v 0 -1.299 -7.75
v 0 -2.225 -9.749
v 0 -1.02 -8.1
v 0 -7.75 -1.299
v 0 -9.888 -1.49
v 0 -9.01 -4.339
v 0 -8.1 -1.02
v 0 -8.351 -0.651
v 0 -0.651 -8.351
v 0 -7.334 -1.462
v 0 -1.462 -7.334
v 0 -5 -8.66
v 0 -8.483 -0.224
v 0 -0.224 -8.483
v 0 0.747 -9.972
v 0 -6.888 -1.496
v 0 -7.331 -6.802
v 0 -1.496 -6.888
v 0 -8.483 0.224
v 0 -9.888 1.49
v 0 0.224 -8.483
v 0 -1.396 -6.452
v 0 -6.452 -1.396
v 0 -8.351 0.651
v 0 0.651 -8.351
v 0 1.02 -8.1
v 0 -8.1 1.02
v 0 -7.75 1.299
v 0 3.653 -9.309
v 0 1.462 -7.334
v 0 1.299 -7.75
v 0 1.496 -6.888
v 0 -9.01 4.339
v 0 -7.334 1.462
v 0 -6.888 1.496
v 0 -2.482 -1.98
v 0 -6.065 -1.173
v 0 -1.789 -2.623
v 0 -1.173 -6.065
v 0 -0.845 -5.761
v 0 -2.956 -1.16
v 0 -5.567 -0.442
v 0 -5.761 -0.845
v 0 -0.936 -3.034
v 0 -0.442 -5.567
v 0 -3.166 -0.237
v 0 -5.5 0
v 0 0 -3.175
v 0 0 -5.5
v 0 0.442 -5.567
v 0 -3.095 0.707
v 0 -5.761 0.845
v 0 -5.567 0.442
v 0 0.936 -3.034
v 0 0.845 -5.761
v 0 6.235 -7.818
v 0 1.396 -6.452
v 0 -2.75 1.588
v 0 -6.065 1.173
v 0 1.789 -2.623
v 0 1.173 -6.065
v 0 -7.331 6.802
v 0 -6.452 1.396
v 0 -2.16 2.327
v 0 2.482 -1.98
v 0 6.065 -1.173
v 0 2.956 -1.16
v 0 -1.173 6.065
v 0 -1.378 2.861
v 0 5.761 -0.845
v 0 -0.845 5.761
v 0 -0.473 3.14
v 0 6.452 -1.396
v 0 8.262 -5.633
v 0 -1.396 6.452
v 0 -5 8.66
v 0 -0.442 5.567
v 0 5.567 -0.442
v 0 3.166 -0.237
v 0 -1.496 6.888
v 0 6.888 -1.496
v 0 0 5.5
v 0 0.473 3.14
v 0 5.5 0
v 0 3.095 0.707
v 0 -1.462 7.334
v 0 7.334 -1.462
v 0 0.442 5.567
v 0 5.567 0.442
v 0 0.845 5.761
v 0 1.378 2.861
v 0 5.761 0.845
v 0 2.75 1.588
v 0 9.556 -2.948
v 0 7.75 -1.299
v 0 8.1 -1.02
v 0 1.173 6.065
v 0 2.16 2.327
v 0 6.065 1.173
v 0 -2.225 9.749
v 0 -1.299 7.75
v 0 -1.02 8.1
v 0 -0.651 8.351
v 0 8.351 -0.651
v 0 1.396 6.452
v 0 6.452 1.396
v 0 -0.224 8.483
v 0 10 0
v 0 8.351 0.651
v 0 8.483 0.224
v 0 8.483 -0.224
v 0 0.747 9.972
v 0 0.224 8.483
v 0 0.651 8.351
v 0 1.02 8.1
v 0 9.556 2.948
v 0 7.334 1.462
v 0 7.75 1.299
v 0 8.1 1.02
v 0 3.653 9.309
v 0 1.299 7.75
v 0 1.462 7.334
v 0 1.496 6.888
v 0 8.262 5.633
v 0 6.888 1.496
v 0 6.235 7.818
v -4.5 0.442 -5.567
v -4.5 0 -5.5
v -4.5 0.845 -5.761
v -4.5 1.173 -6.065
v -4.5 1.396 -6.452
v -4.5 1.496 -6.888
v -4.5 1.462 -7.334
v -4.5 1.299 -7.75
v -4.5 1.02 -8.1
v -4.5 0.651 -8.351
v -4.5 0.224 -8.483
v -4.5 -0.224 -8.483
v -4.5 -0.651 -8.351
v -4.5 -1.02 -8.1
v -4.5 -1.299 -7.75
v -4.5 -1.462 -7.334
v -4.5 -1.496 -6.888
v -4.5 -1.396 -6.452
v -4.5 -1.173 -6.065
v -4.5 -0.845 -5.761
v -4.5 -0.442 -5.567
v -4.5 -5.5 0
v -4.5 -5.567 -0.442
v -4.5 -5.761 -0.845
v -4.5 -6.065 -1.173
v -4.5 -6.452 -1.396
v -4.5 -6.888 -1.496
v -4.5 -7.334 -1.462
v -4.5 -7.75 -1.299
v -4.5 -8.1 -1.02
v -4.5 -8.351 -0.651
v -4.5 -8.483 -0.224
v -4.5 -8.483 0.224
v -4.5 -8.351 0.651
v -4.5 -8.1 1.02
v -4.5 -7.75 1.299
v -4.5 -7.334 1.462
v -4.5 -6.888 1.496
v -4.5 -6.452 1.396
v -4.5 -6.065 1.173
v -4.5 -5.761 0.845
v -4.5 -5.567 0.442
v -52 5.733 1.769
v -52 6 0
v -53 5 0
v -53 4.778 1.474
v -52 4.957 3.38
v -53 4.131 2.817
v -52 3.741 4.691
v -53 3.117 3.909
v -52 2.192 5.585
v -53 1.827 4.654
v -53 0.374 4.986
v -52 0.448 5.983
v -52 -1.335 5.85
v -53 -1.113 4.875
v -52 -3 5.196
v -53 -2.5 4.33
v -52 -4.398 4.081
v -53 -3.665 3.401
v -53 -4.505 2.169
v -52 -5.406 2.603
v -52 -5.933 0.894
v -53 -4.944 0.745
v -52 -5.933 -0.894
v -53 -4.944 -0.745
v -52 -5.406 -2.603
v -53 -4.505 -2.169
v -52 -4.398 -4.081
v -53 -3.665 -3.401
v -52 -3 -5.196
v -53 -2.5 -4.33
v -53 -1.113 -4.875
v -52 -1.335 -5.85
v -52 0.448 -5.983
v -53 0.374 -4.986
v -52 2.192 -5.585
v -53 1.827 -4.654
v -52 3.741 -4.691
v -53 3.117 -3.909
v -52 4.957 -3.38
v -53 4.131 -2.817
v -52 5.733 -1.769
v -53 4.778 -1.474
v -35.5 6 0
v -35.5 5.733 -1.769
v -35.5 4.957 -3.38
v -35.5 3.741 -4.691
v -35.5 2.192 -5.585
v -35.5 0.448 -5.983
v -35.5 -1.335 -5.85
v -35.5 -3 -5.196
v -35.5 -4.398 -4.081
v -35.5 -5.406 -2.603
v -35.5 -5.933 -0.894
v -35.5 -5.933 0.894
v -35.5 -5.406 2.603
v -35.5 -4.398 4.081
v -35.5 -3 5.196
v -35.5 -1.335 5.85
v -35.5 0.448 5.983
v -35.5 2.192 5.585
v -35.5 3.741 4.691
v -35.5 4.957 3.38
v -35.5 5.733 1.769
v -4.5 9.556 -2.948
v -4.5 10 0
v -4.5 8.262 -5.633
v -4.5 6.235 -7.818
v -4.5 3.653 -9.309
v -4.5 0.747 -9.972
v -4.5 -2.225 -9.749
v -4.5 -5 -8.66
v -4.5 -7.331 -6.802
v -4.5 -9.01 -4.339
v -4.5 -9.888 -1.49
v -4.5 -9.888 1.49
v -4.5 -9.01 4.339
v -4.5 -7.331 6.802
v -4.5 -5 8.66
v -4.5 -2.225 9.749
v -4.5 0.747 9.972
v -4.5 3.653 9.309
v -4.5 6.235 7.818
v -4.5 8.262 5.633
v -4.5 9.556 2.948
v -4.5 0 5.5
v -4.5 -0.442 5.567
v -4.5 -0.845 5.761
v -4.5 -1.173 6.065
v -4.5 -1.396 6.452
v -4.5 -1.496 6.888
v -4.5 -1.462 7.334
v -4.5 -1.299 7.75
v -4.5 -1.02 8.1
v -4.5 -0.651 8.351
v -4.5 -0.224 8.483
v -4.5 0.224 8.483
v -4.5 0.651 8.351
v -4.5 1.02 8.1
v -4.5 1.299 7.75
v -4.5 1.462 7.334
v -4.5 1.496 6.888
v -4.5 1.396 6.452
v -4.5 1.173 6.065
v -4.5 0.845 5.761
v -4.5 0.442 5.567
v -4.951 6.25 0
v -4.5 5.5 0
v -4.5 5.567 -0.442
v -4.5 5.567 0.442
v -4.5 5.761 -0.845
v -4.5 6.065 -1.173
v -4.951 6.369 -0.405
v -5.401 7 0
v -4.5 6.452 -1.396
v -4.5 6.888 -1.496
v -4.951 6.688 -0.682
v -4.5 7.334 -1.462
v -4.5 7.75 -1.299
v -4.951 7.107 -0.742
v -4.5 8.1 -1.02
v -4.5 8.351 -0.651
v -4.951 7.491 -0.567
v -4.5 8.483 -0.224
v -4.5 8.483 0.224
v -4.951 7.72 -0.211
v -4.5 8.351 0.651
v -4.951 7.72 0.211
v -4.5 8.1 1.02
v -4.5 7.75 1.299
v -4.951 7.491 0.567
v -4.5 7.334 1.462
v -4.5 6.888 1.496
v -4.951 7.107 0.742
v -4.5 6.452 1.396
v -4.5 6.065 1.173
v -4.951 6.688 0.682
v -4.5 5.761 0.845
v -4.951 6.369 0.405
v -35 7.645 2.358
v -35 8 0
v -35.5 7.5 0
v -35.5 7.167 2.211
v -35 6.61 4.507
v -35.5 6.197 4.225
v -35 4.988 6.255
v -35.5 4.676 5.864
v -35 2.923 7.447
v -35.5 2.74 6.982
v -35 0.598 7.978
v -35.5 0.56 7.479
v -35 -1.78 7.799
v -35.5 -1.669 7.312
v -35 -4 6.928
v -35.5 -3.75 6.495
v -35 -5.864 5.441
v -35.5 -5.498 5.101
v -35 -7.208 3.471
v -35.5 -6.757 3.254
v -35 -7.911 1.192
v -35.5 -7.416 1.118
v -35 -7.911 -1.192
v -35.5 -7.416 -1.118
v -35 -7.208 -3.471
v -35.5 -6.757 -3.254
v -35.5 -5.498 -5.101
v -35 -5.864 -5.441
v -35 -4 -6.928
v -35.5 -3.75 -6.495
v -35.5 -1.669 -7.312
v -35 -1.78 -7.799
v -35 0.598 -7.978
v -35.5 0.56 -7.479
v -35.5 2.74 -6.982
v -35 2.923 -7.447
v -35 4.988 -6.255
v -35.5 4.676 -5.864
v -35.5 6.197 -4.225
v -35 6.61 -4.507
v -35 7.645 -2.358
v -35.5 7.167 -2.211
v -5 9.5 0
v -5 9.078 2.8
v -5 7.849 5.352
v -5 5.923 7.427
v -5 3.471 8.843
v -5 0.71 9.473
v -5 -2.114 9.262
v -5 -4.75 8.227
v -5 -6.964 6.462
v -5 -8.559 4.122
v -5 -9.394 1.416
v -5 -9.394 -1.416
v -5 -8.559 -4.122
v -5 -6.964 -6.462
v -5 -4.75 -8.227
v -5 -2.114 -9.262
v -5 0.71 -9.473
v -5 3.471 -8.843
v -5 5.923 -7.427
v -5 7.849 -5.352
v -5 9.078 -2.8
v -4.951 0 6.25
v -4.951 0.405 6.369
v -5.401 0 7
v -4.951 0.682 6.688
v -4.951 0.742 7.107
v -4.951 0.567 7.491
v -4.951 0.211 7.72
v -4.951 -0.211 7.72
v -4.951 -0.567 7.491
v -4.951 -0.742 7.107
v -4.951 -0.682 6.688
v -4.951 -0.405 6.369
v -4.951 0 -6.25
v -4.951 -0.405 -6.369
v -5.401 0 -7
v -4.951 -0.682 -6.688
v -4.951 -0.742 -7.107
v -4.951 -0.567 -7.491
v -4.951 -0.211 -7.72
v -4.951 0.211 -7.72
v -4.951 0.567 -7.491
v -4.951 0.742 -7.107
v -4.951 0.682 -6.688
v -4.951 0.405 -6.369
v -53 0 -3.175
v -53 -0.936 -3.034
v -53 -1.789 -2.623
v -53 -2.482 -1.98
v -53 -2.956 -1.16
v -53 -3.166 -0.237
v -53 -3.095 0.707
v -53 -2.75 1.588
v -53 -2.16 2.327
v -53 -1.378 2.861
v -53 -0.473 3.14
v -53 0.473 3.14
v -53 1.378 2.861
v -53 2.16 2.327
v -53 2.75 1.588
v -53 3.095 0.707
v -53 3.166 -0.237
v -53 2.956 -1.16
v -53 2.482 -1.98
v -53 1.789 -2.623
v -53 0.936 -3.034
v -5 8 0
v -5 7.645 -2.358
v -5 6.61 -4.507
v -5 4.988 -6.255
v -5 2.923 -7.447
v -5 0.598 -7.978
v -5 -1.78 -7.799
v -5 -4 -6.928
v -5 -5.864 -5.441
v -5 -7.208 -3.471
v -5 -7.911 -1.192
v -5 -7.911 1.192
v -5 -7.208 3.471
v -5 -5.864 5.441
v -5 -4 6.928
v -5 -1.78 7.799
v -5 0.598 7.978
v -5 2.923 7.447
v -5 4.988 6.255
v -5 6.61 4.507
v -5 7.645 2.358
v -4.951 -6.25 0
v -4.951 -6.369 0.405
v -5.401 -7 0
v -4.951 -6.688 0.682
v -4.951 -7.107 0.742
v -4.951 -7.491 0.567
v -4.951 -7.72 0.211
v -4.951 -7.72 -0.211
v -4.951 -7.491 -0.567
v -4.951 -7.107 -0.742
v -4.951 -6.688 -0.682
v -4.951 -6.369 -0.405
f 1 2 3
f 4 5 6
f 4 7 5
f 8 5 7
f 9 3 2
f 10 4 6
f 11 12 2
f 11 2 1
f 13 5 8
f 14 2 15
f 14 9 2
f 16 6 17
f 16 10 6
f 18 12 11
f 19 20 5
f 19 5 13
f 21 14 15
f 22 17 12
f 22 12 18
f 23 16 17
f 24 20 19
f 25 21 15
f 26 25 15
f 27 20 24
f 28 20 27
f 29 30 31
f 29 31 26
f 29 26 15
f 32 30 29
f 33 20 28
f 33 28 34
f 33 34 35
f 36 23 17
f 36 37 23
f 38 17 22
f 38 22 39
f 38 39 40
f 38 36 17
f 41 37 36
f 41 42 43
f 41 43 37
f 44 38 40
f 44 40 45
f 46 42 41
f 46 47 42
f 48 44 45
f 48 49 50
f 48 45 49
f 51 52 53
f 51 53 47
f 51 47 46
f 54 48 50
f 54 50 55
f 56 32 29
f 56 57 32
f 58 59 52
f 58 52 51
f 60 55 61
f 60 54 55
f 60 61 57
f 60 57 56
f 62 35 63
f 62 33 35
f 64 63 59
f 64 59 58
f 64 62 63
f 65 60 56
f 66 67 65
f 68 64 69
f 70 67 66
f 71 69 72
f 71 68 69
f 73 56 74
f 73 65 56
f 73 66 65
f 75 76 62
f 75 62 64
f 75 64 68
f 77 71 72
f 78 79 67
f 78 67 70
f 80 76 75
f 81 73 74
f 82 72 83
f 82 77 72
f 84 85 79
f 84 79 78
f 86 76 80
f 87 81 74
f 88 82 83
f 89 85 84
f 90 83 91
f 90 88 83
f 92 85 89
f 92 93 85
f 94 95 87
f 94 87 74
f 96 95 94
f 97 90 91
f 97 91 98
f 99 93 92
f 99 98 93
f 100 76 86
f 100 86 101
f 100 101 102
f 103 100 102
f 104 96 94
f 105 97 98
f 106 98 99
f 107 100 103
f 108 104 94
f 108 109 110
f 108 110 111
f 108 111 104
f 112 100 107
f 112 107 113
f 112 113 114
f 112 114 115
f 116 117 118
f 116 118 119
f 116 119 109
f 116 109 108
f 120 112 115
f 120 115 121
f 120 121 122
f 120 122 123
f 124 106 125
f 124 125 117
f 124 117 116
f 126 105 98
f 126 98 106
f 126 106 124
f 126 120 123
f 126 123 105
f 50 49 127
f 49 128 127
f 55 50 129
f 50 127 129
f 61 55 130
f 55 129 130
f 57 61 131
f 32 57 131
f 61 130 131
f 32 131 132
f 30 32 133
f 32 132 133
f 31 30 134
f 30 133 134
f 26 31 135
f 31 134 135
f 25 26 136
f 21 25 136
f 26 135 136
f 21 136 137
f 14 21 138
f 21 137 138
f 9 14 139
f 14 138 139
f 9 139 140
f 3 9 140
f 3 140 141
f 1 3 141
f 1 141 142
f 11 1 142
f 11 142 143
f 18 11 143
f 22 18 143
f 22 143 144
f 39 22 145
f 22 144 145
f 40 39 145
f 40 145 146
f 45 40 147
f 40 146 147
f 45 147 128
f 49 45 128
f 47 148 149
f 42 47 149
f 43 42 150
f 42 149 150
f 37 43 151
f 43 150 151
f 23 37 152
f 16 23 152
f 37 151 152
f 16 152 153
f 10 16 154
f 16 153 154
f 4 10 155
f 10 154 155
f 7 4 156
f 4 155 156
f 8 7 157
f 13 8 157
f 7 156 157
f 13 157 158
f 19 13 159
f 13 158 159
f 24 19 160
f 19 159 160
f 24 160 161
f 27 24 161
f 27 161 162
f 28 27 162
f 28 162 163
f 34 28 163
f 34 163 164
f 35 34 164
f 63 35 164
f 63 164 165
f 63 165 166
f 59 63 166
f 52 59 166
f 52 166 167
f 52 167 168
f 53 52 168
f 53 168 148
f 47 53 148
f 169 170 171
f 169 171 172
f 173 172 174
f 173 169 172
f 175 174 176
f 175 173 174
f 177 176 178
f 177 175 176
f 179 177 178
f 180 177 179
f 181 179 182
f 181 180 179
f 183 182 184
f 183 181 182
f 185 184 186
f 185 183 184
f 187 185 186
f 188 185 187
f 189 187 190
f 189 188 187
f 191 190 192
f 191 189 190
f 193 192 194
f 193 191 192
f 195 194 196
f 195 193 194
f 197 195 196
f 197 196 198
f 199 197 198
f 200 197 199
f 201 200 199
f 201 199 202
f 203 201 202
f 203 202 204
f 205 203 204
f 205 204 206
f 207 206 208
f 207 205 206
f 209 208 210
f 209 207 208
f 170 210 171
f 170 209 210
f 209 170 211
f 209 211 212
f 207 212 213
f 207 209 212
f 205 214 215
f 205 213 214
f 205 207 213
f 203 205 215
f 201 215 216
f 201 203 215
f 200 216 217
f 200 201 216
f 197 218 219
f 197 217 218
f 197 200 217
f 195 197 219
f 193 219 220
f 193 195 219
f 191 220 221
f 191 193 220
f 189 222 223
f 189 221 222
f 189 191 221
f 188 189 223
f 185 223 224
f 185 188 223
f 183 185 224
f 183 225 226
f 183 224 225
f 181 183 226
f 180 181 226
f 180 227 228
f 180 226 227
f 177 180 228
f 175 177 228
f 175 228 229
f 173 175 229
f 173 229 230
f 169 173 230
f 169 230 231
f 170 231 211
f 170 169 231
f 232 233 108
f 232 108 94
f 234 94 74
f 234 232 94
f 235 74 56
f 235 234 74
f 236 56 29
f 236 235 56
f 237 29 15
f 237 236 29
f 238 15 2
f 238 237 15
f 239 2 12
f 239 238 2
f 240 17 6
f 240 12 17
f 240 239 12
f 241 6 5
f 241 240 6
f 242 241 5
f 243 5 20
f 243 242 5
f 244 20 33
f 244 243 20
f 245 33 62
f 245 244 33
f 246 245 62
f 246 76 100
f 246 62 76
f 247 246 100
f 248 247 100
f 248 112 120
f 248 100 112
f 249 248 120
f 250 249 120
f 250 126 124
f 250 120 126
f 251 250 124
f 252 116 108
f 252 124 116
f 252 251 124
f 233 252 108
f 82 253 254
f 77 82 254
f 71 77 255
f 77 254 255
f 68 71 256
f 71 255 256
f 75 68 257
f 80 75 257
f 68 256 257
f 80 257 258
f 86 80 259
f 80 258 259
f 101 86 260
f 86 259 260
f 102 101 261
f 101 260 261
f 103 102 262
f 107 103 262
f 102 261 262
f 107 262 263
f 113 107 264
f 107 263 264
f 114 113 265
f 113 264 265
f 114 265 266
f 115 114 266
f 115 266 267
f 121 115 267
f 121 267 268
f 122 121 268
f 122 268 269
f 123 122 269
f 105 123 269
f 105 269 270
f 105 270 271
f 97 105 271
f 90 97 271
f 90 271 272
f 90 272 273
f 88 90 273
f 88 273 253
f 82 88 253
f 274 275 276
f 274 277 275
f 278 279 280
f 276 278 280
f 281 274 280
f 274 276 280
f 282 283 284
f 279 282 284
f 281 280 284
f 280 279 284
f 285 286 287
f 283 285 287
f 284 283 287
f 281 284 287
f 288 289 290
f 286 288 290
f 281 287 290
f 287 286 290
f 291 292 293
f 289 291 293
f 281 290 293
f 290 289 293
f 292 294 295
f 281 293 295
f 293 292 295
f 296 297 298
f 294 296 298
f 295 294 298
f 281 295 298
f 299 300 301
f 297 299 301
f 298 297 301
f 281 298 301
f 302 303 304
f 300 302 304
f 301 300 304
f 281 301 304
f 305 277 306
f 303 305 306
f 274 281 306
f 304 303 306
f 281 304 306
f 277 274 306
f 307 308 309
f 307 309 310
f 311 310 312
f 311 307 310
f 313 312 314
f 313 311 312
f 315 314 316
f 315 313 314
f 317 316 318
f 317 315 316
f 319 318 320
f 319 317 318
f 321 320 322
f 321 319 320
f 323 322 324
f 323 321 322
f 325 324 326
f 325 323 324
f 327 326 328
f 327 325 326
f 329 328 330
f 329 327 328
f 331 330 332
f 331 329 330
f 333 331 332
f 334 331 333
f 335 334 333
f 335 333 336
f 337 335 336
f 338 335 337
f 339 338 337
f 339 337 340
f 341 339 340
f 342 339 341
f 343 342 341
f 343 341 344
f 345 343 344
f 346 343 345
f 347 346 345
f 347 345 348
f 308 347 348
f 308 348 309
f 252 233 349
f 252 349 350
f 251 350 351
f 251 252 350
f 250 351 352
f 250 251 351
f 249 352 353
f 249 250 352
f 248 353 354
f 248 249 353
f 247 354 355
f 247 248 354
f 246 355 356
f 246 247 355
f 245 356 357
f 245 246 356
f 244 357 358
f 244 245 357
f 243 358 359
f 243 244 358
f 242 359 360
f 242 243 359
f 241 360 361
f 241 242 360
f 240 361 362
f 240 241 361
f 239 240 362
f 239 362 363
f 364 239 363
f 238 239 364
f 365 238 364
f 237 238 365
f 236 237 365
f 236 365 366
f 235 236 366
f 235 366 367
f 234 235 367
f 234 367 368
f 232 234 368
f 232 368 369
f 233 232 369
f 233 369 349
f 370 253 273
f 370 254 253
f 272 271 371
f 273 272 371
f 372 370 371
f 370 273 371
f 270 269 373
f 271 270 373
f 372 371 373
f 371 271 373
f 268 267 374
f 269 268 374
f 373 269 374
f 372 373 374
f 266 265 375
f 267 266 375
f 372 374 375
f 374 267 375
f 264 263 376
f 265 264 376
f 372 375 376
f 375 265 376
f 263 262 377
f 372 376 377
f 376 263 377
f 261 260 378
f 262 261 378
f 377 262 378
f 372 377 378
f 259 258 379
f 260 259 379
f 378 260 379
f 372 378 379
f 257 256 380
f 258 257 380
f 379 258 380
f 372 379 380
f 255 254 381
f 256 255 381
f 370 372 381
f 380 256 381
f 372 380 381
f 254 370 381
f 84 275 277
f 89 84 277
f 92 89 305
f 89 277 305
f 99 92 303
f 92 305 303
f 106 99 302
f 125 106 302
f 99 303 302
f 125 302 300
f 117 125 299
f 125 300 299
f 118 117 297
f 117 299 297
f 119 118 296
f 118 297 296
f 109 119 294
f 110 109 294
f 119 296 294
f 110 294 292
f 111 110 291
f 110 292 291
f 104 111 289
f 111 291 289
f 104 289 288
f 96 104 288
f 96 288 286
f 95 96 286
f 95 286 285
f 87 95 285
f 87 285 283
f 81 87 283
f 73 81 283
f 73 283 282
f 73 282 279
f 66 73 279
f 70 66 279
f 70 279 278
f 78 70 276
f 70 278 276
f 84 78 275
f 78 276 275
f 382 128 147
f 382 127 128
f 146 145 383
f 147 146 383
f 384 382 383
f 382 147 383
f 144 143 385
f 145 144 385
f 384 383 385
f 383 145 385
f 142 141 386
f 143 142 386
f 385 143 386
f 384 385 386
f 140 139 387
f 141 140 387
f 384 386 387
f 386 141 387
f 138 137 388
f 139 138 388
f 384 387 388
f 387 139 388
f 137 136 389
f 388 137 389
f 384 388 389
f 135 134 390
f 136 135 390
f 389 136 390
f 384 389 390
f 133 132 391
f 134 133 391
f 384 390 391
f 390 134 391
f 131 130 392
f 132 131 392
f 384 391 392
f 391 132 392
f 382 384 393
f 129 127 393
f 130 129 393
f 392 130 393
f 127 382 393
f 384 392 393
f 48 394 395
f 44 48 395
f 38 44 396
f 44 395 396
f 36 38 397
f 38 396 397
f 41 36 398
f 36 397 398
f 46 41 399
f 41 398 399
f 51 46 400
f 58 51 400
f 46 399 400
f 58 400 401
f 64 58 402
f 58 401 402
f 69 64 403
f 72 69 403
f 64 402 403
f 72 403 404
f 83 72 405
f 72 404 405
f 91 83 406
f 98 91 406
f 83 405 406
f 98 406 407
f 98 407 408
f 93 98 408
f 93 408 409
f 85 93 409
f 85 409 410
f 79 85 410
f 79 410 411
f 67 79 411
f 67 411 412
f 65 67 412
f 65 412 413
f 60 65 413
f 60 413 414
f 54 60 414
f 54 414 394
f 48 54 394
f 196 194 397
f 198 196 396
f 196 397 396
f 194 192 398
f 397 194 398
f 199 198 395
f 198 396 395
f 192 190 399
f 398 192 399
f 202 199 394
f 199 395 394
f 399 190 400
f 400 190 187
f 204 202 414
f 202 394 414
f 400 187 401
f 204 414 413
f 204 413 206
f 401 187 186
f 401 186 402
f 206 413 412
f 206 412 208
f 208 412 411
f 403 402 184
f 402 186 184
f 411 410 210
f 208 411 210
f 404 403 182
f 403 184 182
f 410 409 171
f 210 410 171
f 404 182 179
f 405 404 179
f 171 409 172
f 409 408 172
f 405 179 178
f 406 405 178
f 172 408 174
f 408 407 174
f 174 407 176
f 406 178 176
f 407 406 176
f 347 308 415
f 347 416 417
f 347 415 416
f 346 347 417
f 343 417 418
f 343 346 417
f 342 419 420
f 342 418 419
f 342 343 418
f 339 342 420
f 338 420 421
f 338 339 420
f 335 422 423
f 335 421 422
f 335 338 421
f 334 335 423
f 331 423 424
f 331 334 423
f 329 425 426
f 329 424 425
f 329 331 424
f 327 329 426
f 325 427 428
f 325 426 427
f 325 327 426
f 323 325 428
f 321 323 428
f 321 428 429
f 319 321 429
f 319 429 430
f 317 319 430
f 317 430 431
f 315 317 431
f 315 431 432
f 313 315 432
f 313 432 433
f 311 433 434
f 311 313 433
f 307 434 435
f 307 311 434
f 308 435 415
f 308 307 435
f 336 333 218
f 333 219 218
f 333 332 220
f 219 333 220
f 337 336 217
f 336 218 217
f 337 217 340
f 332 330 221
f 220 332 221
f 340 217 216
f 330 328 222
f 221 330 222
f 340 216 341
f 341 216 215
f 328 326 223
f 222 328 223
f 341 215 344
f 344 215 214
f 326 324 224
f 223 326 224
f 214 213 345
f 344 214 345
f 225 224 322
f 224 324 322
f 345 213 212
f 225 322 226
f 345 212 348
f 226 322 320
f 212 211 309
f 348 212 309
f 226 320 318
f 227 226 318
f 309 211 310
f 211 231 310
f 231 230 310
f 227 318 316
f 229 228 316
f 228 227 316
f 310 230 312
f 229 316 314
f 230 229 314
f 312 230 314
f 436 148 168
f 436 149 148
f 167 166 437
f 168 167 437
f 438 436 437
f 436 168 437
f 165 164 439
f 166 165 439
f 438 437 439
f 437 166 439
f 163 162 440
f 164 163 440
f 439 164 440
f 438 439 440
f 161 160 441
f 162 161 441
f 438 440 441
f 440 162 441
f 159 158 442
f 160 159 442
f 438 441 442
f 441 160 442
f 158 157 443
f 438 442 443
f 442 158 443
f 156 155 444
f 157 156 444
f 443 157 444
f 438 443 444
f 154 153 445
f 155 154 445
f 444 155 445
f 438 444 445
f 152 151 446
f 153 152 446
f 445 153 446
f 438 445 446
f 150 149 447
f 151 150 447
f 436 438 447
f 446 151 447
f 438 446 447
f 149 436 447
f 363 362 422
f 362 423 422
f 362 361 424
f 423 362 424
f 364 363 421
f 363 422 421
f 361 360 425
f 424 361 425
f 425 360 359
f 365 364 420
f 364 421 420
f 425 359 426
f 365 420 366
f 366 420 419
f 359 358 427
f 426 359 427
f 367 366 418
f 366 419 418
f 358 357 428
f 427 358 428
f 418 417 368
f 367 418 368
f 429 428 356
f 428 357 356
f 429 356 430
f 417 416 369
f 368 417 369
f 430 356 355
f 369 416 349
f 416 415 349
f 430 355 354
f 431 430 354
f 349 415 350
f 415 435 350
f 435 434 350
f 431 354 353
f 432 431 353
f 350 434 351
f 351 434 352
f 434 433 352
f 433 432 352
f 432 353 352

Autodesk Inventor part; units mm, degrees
ref_plane "YZ Plane" through (0, 0, 0) normal (1, 0, 0) x (0, 1, 0)
ref_plane "XZ Plane" through (0, 0, 0) normal (0, 1, 0) x (-1, 0, 0)
ref_plane "XY Plane" through (0, 0, 0) normal (0, 0, 1) x (1, 0, 0)
sketch "Sketch1" plane through (0, 0, 0) normal (0, 0, 1) x (1, 0, 0)
  line L0 (0, 0) -> (0, 10)
  line L1 (0, 10) -> (-5, 10)
  line L2 (-5, 10) -> (-5, 8)
  line L3 (-5, 8) -> (-35.5, 8)
  line L4 (-35.5, 8) -> (-35.5, 6)
  line L5 (-35.5, 6) -> (-53, 6)
  line L6 (-53, 6) -> (-53, 0)
  line L7 (-53, 0) -> (0, 0)
  dimension "d1" = 10
  dimension "d2" = 5
  dimension "d3" = 2
  dimension "d4" = 2
  dimension "d5" = 35.5
  dimension "d6" = 53
revolve "Revolution1" add sketch "Sketch1" angle 360 about axis through (-53, 0, 0) along (1, 0, 0)
thread "Thread1" size "M12x1.75" class "6g" standard "ISO Metric profile" length 16 offset 2
chamfer "Chamfer1" distance 1 angle 45 1 edges at (-53, -6, 0)
chamfer "Chamfer2" distance 0.5 angle 45 2 edges at (-35.5, -8, 0) (-5, -10, 0)
sketch "Sketch2" plane through (0, 0, 0) normal (1, 0, 0) x (0, 0, -1)
  circle A0 centre (0, 0) radius 7
  dimension "d17" = 14
hole "Hole1" at (0, 0, 0) direction (-1, 0, 0) diameter 6.35 end through all
sketch "Sketch3" plane through (0, 0, 0) normal (1, 0, 0) x (0, 0, -1)
  circle A0 centre (0, 0) radius 7
  line L0 (0, 0) -> (-7, 0)
  dimension "d25" = 14
hole "Hole2" at (0, 0, 7) direction (-1, 0, 0) diameter 3 depth 4.5 tip angle 118
pattern_circular "Circular Pattern1" count 4 over 360 about axis through (-60.075, 0, 0) along (1, 0, 0) of "Hole2"
properties part number "BronzeHollowScrew" material "Bronze, Soft Tin"
